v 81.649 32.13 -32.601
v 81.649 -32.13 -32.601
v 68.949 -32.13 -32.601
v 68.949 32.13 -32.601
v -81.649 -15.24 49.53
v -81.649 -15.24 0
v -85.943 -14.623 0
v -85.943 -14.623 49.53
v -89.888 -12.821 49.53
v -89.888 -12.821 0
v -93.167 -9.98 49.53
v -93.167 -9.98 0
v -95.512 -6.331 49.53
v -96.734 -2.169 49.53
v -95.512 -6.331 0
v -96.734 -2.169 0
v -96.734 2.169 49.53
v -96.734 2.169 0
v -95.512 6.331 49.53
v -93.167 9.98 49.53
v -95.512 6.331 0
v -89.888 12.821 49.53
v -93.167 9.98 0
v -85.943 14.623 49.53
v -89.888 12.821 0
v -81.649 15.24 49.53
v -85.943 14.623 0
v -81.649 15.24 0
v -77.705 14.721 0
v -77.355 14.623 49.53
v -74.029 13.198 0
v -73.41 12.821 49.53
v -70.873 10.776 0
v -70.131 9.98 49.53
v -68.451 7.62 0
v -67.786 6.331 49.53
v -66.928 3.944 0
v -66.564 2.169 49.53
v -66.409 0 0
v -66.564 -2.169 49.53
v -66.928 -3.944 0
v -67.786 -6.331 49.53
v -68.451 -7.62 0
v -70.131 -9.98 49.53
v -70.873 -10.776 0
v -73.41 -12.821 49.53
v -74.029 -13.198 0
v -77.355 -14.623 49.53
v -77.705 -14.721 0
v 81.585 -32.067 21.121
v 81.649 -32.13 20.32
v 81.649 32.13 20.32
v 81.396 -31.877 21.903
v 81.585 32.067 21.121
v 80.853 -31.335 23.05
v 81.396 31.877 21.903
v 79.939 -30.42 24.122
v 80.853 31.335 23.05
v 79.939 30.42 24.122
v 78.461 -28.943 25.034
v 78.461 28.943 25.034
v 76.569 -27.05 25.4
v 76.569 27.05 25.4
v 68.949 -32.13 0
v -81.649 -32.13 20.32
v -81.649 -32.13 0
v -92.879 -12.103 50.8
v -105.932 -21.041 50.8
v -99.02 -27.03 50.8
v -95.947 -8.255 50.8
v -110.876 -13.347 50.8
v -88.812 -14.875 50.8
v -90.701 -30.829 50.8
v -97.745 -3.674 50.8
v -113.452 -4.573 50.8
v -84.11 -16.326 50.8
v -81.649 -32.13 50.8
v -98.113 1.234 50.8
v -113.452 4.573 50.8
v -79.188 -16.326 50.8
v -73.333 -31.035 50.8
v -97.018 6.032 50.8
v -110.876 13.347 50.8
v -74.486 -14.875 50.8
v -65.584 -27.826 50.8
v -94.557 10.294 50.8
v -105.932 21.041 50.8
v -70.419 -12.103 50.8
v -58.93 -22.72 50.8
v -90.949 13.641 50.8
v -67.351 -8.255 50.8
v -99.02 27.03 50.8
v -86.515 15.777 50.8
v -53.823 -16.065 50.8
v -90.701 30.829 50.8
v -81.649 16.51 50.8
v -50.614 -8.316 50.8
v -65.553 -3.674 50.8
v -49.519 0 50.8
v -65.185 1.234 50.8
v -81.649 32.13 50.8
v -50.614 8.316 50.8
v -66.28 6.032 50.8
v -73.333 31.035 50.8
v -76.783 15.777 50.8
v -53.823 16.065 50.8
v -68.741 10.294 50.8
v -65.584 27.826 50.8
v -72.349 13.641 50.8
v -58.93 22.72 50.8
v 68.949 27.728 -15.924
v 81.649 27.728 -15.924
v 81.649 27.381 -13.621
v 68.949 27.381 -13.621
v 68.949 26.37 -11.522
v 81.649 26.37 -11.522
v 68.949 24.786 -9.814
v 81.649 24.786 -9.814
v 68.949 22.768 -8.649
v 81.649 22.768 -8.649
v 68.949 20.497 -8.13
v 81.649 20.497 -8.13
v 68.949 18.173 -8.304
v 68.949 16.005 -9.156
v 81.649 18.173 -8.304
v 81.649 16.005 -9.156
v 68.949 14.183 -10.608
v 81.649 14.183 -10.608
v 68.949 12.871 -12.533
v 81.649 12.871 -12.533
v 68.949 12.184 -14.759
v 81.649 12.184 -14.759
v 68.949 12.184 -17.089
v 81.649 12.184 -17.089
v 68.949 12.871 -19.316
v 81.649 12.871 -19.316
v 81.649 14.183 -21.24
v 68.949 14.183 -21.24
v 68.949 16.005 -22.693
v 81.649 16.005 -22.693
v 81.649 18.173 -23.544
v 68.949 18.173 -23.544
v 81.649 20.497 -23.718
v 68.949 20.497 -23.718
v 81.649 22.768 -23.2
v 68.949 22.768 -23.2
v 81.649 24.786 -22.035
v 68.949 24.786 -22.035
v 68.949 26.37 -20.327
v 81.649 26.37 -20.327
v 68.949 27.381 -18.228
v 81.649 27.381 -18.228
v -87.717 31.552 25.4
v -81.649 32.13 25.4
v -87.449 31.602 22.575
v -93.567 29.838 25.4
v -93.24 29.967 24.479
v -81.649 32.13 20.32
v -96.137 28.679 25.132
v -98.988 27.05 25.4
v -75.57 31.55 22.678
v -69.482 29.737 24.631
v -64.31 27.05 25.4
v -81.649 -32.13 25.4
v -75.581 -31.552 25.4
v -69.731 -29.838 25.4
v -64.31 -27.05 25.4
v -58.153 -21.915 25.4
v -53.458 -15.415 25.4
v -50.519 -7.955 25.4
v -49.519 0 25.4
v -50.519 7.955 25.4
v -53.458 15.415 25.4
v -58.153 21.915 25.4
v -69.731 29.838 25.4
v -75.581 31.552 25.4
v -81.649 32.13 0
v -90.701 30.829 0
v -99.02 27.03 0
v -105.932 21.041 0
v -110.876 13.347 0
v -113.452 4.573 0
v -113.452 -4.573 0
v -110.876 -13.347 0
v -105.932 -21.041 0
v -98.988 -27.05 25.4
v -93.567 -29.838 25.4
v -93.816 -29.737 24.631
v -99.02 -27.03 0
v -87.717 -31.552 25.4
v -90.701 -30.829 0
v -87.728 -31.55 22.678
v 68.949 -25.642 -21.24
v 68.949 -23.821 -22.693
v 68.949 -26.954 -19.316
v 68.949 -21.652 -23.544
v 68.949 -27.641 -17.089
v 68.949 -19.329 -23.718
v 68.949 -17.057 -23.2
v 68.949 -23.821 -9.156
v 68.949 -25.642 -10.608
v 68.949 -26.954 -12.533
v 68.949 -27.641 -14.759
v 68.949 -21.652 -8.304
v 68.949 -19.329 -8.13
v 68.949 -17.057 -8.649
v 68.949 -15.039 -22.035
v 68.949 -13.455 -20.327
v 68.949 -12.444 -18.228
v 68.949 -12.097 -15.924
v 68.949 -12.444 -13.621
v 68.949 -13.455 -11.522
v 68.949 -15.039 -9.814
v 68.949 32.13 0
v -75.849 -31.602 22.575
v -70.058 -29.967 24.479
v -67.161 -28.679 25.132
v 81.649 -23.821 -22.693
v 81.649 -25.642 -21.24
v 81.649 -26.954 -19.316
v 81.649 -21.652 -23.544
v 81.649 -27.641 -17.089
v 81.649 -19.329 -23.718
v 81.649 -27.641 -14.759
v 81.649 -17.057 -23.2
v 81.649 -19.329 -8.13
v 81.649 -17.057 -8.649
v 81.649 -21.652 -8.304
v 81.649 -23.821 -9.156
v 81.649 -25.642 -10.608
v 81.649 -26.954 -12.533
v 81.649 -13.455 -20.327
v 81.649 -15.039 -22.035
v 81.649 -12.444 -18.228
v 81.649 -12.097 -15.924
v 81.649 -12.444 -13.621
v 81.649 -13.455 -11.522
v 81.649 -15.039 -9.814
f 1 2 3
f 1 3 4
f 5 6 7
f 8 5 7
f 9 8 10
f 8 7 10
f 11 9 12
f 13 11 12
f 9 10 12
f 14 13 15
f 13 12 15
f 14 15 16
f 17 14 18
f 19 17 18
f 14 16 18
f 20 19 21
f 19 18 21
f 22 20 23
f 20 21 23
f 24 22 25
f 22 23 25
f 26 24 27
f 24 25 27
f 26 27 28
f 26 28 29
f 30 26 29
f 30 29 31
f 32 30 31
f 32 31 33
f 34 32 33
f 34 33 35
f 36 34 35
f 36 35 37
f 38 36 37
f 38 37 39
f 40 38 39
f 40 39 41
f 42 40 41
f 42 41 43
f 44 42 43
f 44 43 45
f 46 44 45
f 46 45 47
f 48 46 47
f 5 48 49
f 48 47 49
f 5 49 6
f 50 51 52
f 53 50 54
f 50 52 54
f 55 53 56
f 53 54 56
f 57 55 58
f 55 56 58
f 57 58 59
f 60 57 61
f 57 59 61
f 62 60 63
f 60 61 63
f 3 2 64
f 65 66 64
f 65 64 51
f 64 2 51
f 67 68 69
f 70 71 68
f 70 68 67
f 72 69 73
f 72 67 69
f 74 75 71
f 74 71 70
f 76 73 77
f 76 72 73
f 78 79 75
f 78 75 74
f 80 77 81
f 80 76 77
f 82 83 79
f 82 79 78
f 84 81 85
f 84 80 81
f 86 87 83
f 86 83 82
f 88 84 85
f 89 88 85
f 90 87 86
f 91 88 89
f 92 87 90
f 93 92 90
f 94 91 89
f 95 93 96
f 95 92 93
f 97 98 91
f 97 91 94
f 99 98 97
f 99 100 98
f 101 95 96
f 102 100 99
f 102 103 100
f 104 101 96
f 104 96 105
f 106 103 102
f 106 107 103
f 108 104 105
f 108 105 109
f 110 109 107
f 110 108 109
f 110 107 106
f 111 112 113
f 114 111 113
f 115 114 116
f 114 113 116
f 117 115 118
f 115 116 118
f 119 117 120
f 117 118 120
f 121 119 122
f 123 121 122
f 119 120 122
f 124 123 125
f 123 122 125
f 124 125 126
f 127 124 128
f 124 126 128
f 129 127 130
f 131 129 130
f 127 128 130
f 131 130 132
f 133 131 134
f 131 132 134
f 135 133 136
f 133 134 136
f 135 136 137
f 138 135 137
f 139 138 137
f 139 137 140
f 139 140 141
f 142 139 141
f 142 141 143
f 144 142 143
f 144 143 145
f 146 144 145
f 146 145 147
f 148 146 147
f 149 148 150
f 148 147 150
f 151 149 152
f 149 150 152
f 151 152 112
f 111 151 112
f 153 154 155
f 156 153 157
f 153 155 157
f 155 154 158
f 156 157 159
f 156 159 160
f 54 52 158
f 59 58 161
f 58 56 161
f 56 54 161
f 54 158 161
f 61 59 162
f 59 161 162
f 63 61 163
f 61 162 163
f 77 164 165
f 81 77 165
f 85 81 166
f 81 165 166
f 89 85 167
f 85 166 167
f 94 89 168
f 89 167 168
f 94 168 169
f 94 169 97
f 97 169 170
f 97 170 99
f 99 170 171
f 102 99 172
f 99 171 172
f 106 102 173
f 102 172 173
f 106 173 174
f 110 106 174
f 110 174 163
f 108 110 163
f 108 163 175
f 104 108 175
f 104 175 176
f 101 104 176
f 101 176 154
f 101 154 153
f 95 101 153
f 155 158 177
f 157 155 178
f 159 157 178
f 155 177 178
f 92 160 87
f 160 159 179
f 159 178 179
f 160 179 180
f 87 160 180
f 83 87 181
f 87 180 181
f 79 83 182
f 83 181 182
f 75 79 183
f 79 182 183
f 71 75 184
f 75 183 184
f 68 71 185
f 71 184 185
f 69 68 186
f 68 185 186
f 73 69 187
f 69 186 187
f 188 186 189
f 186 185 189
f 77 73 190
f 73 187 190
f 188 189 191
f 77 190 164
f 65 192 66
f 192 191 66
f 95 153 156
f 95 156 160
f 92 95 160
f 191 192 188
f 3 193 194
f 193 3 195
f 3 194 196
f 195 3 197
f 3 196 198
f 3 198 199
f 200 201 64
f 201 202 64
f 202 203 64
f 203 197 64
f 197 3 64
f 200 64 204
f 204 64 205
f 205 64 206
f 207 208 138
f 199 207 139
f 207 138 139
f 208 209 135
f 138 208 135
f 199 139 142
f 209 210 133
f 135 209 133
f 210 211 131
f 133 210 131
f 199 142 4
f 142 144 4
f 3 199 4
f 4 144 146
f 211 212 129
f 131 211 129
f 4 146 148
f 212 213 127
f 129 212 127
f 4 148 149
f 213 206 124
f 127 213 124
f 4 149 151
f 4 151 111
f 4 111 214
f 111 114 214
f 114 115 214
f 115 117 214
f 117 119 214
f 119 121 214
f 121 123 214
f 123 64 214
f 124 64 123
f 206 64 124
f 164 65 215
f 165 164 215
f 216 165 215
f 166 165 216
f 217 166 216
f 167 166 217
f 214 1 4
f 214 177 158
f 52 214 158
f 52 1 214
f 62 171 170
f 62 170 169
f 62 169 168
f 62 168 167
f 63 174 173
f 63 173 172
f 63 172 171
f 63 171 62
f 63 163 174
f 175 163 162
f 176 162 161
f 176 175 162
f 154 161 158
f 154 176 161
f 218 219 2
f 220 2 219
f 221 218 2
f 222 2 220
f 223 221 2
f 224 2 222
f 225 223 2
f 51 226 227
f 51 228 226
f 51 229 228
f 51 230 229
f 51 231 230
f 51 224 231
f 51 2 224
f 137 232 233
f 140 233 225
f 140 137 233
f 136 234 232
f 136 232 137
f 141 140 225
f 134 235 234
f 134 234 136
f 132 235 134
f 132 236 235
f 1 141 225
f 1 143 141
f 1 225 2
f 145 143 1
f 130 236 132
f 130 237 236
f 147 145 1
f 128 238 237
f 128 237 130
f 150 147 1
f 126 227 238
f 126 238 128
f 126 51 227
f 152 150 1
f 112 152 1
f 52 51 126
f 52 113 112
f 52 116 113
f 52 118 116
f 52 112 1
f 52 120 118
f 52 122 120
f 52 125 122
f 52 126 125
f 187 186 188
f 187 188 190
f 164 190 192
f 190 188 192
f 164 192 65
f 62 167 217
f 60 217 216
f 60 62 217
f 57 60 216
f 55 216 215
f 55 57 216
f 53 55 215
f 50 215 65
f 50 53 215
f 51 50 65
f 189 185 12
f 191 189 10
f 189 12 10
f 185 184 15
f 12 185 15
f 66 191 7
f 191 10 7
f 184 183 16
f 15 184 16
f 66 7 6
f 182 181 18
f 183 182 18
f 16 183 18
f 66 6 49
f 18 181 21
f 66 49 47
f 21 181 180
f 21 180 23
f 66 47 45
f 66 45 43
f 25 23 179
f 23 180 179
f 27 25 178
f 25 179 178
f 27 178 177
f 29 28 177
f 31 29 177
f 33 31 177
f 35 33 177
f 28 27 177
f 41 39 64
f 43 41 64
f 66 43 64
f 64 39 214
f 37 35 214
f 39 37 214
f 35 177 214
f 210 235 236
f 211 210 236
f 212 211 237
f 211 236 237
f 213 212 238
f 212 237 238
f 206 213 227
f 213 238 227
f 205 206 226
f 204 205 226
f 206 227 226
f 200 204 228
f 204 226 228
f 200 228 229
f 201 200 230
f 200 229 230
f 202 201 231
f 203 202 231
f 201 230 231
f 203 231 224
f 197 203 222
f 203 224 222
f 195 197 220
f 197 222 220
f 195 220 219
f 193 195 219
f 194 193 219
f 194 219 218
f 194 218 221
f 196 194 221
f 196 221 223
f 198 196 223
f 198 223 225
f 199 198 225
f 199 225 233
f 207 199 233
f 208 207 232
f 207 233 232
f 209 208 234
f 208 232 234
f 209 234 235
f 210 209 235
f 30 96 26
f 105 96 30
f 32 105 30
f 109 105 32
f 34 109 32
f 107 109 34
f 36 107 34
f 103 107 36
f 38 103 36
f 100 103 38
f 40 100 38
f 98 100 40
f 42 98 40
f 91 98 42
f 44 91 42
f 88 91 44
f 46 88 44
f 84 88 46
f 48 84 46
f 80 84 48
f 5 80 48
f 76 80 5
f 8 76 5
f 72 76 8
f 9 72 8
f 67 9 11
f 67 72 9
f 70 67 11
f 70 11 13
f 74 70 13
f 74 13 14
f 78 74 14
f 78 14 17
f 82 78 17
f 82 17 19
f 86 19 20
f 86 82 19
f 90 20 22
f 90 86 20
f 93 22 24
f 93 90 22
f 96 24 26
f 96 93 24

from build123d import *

# Parameters (mm, degrees)
F1_DEPTH     = 25.4
F2_DEPTH     = 50.8
F3_W         = 64.2605721951
F3_H         = 58.0011609286
F3_R         = 7.8158537252
F4_DEPTH     = 12.7
F5_T1_DEPTH  = 89.6605721951
F5_T6_DEPTH  = 197.5881144994
F5_S7_R      = 32.1302860975
F5_T8_DEPTH  = 100
F5_T12_DEPTH = 197.5881144994
F5_S13_R     = 32.1302860975
F5_T14_DEPTH = 100


# Not quite as in the source:
# - a fillet or chamfer that OpenCascade refuses, or shapes differently, is made with other operations: its cross-section is extruded or revolved along the edge and cut away or added


with BuildPart() as f1:
    # F0 (on Top) → F1 (new body)
    with BuildSketch(Plane.XY):
        with BuildLine():
            Line((81.6490572497, -32.1302860975), (81.6490572497, 32.1302860975))
            Line((81.6490572497, 32.1302860975), (-81.6490572497, 32.1302860975))
            ThreePointArc((-81.6490572497, 32.1302860975), (-58.9295140687, 22.719543181), (-49.5187711522, 0))
            ThreePointArc((-49.5187711522, 0), (-58.9295140687, -22.719543181), (-81.6490572497, -32.1302860975))
            Line((-81.6490572497, -32.1302860975), (81.6490572497, -32.1302860975))
        make_face()
        with BuildLine():
            Line((-81.6490572497, 15.24), (-81.6490572497, 32.1302860975))
            ThreePointArc((-81.6490572497, 32.1302860975), (-113.7793433473, 0), (-81.6490572497, -32.1302860975))
            Line((-81.6490572497, -32.1302860975), (-81.6490572497, -15.24))
            ThreePointArc((-81.6490572497, -15.24), (-96.8890572497, 0), (-81.6490572497, 15.24))
        make_face()
        with BuildLine():
            ThreePointArc((-49.5187711522, 0), (-58.9295140687, 22.719543181), (-81.6490572497, 32.1302860975))
            Line((-81.6490572497, 32.1302860975), (-81.6490572497, 15.24))
            ThreePointArc((-81.6490572497, 15.24), (-70.8727499044, 10.7763073453), (-66.4090572497, 0))
            ThreePointArc((-66.4090572497, 0), (-70.8727499044, -10.7763073453), (-81.6490572497, -15.24))
            Line((-81.6490572497, -15.24), (-81.6490572497, -32.1302860975))
            ThreePointArc((-81.6490572497, -32.1302860975), (-58.9295140687, -22.719543181), (-49.5187711522, 0))
        make_face()
    extrude(amount=F1_DEPTH)

    # F0 (on Top) → F2 (join)
    with BuildSketch(Plane.XY):
        with BuildLine():
            Line((-81.6490572497, 15.24), (-81.6490572497, 32.1302860975))
            ThreePointArc((-81.6490572497, 32.1302860975), (-113.7793433473, 0), (-81.6490572497, -32.1302860975))
            Line((-81.6490572497, -32.1302860975), (-81.6490572497, -15.24))
            ThreePointArc((-81.6490572497, -15.24), (-96.8890572497, 0), (-81.6490572497, 15.24))
        make_face()
        with BuildLine():
            ThreePointArc((-49.5187711522, 0), (-58.9295140687, 22.719543181), (-81.6490572497, 32.1302860975))
            Line((-81.6490572497, 32.1302860975), (-81.6490572497, 15.24))
            ThreePointArc((-81.6490572497, 15.24), (-70.8727499044, 10.7763073453), (-66.4090572497, 0))
            ThreePointArc((-66.4090572497, 0), (-70.8727499044, -10.7763073453), (-81.6490572497, -15.24))
            Line((-81.6490572497, -15.24), (-81.6490572497, -32.1302860975))
            ThreePointArc((-81.6490572497, -32.1302860975), (-58.9295140687, -22.719543181), (-49.5187711522, 0))
        make_face()
    extrude(amount=F2_DEPTH)

    # F3 (on face) → F4 (join)
    with BuildSketch(Plane.YZ.offset(81.6490572497)):
        with Locations((0, -3.6005804643)):
            Rectangle(F3_W, F3_H)
        with Locations((-19.9125986546, -15.9243624657)):
            Circle(F3_R, mode=Mode.SUBTRACT)
        with Locations((19.9125986546, -15.9243624657)):
            Circle(F3_R, mode=Mode.SUBTRACT)
    extrude(amount=-F4_DEPTH)

    # F5: fillet of radius 5.08 on 3 edges, made by hand

    # F5_s2 → F5_t1 (cut)
    with BuildSketch(Plane.XZ.offset(-44.8302860975)):
        with BuildLine():
            ThreePointArc((81.6490572497, 20.32), (80.1611596982, 23.9121024484), (76.5690572497, 25.4))
            Line((76.5690572497, 25.4), (81.6490572497, 25.4))
            Line((81.6490572497, 25.4), (81.6490572497, 20.32))
        make_face()
    extrude(amount=F5_T1_DEPTH, mode=Mode.SUBTRACT)


with BuildPart() as f5_tool4:
    # F5_s5 → F5_t6 (new body)
    with BuildSketch(Plane.YZ.offset(94.3490572497)):
        with BuildLine():
            ThreePointArc((-27.0502860975, 25.4), (-30.642388546, 23.9121024484), (-32.1302860975, 20.32))
            Line((-32.1302860975, 20.32), (-32.1302860975, 25.4))
            Line((-32.1302860975, 25.4), (-27.0502860975, 25.4))
        make_face()
    extrude(amount=-F5_T6_DEPTH)

    # F5_s7 → F5_t8 (cut, symmetric)
    with BuildSketch(Plane.XY.offset(22.9)):
        with Locations((-81.6490572497, 0)):
            Circle(F5_S7_R)
    extrude(amount=F5_T8_DEPTH, both=True, mode=Mode.SUBTRACT)


with BuildPart() as f1_1:
    add(f1.part)

    # F5_t3: cut F5_tool4
    add(f5_tool4.part, mode=Mode.SUBTRACT)


with BuildPart() as f5_tool10:
    # F5_s11 → F5_t12 (new body)
    with BuildSketch(Plane.YZ.offset(-103.2390572497)):
        with BuildLine():
            ThreePointArc((32.1302860975, 20.32), (30.642388546, 23.9121024484), (27.0502860975, 25.4))
            Line((27.0502860975, 25.4), (32.1302860975, 25.4))
            Line((32.1302860975, 25.4), (32.1302860975, 20.32))
        make_face()
    extrude(amount=F5_T12_DEPTH)

    # F5_s13 → F5_t14 (cut, symmetric)
    with BuildSketch(Plane.XY.offset(22.9)):
        with Locations((-81.6490572497, 0)):
            Circle(F5_S13_R)
    extrude(amount=F5_T14_DEPTH, both=True, mode=Mode.SUBTRACT)


with BuildPart() as f1_2:
    add(f1_1.part)

    # F5_t9: cut F5_tool10
    add(f5_tool10.part, mode=Mode.SUBTRACT)

    # F6: chamfer of 1.27 on 1 edges, made by hand

    # F6_s1 → F6_t2 (revolve, cut)
    with BuildSketch(Plane.YZ.offset(-81.6490572497)):
        Polygon((15.24, 49.53), (16.51, 50.8), (15.24, 50.8), align=None)
    revolve(axis=Axis((-81.6490572497, 0, 50.8), (0, 0, -1)), mode=Mode.SUBTRACT)


solid = f1_2.part
